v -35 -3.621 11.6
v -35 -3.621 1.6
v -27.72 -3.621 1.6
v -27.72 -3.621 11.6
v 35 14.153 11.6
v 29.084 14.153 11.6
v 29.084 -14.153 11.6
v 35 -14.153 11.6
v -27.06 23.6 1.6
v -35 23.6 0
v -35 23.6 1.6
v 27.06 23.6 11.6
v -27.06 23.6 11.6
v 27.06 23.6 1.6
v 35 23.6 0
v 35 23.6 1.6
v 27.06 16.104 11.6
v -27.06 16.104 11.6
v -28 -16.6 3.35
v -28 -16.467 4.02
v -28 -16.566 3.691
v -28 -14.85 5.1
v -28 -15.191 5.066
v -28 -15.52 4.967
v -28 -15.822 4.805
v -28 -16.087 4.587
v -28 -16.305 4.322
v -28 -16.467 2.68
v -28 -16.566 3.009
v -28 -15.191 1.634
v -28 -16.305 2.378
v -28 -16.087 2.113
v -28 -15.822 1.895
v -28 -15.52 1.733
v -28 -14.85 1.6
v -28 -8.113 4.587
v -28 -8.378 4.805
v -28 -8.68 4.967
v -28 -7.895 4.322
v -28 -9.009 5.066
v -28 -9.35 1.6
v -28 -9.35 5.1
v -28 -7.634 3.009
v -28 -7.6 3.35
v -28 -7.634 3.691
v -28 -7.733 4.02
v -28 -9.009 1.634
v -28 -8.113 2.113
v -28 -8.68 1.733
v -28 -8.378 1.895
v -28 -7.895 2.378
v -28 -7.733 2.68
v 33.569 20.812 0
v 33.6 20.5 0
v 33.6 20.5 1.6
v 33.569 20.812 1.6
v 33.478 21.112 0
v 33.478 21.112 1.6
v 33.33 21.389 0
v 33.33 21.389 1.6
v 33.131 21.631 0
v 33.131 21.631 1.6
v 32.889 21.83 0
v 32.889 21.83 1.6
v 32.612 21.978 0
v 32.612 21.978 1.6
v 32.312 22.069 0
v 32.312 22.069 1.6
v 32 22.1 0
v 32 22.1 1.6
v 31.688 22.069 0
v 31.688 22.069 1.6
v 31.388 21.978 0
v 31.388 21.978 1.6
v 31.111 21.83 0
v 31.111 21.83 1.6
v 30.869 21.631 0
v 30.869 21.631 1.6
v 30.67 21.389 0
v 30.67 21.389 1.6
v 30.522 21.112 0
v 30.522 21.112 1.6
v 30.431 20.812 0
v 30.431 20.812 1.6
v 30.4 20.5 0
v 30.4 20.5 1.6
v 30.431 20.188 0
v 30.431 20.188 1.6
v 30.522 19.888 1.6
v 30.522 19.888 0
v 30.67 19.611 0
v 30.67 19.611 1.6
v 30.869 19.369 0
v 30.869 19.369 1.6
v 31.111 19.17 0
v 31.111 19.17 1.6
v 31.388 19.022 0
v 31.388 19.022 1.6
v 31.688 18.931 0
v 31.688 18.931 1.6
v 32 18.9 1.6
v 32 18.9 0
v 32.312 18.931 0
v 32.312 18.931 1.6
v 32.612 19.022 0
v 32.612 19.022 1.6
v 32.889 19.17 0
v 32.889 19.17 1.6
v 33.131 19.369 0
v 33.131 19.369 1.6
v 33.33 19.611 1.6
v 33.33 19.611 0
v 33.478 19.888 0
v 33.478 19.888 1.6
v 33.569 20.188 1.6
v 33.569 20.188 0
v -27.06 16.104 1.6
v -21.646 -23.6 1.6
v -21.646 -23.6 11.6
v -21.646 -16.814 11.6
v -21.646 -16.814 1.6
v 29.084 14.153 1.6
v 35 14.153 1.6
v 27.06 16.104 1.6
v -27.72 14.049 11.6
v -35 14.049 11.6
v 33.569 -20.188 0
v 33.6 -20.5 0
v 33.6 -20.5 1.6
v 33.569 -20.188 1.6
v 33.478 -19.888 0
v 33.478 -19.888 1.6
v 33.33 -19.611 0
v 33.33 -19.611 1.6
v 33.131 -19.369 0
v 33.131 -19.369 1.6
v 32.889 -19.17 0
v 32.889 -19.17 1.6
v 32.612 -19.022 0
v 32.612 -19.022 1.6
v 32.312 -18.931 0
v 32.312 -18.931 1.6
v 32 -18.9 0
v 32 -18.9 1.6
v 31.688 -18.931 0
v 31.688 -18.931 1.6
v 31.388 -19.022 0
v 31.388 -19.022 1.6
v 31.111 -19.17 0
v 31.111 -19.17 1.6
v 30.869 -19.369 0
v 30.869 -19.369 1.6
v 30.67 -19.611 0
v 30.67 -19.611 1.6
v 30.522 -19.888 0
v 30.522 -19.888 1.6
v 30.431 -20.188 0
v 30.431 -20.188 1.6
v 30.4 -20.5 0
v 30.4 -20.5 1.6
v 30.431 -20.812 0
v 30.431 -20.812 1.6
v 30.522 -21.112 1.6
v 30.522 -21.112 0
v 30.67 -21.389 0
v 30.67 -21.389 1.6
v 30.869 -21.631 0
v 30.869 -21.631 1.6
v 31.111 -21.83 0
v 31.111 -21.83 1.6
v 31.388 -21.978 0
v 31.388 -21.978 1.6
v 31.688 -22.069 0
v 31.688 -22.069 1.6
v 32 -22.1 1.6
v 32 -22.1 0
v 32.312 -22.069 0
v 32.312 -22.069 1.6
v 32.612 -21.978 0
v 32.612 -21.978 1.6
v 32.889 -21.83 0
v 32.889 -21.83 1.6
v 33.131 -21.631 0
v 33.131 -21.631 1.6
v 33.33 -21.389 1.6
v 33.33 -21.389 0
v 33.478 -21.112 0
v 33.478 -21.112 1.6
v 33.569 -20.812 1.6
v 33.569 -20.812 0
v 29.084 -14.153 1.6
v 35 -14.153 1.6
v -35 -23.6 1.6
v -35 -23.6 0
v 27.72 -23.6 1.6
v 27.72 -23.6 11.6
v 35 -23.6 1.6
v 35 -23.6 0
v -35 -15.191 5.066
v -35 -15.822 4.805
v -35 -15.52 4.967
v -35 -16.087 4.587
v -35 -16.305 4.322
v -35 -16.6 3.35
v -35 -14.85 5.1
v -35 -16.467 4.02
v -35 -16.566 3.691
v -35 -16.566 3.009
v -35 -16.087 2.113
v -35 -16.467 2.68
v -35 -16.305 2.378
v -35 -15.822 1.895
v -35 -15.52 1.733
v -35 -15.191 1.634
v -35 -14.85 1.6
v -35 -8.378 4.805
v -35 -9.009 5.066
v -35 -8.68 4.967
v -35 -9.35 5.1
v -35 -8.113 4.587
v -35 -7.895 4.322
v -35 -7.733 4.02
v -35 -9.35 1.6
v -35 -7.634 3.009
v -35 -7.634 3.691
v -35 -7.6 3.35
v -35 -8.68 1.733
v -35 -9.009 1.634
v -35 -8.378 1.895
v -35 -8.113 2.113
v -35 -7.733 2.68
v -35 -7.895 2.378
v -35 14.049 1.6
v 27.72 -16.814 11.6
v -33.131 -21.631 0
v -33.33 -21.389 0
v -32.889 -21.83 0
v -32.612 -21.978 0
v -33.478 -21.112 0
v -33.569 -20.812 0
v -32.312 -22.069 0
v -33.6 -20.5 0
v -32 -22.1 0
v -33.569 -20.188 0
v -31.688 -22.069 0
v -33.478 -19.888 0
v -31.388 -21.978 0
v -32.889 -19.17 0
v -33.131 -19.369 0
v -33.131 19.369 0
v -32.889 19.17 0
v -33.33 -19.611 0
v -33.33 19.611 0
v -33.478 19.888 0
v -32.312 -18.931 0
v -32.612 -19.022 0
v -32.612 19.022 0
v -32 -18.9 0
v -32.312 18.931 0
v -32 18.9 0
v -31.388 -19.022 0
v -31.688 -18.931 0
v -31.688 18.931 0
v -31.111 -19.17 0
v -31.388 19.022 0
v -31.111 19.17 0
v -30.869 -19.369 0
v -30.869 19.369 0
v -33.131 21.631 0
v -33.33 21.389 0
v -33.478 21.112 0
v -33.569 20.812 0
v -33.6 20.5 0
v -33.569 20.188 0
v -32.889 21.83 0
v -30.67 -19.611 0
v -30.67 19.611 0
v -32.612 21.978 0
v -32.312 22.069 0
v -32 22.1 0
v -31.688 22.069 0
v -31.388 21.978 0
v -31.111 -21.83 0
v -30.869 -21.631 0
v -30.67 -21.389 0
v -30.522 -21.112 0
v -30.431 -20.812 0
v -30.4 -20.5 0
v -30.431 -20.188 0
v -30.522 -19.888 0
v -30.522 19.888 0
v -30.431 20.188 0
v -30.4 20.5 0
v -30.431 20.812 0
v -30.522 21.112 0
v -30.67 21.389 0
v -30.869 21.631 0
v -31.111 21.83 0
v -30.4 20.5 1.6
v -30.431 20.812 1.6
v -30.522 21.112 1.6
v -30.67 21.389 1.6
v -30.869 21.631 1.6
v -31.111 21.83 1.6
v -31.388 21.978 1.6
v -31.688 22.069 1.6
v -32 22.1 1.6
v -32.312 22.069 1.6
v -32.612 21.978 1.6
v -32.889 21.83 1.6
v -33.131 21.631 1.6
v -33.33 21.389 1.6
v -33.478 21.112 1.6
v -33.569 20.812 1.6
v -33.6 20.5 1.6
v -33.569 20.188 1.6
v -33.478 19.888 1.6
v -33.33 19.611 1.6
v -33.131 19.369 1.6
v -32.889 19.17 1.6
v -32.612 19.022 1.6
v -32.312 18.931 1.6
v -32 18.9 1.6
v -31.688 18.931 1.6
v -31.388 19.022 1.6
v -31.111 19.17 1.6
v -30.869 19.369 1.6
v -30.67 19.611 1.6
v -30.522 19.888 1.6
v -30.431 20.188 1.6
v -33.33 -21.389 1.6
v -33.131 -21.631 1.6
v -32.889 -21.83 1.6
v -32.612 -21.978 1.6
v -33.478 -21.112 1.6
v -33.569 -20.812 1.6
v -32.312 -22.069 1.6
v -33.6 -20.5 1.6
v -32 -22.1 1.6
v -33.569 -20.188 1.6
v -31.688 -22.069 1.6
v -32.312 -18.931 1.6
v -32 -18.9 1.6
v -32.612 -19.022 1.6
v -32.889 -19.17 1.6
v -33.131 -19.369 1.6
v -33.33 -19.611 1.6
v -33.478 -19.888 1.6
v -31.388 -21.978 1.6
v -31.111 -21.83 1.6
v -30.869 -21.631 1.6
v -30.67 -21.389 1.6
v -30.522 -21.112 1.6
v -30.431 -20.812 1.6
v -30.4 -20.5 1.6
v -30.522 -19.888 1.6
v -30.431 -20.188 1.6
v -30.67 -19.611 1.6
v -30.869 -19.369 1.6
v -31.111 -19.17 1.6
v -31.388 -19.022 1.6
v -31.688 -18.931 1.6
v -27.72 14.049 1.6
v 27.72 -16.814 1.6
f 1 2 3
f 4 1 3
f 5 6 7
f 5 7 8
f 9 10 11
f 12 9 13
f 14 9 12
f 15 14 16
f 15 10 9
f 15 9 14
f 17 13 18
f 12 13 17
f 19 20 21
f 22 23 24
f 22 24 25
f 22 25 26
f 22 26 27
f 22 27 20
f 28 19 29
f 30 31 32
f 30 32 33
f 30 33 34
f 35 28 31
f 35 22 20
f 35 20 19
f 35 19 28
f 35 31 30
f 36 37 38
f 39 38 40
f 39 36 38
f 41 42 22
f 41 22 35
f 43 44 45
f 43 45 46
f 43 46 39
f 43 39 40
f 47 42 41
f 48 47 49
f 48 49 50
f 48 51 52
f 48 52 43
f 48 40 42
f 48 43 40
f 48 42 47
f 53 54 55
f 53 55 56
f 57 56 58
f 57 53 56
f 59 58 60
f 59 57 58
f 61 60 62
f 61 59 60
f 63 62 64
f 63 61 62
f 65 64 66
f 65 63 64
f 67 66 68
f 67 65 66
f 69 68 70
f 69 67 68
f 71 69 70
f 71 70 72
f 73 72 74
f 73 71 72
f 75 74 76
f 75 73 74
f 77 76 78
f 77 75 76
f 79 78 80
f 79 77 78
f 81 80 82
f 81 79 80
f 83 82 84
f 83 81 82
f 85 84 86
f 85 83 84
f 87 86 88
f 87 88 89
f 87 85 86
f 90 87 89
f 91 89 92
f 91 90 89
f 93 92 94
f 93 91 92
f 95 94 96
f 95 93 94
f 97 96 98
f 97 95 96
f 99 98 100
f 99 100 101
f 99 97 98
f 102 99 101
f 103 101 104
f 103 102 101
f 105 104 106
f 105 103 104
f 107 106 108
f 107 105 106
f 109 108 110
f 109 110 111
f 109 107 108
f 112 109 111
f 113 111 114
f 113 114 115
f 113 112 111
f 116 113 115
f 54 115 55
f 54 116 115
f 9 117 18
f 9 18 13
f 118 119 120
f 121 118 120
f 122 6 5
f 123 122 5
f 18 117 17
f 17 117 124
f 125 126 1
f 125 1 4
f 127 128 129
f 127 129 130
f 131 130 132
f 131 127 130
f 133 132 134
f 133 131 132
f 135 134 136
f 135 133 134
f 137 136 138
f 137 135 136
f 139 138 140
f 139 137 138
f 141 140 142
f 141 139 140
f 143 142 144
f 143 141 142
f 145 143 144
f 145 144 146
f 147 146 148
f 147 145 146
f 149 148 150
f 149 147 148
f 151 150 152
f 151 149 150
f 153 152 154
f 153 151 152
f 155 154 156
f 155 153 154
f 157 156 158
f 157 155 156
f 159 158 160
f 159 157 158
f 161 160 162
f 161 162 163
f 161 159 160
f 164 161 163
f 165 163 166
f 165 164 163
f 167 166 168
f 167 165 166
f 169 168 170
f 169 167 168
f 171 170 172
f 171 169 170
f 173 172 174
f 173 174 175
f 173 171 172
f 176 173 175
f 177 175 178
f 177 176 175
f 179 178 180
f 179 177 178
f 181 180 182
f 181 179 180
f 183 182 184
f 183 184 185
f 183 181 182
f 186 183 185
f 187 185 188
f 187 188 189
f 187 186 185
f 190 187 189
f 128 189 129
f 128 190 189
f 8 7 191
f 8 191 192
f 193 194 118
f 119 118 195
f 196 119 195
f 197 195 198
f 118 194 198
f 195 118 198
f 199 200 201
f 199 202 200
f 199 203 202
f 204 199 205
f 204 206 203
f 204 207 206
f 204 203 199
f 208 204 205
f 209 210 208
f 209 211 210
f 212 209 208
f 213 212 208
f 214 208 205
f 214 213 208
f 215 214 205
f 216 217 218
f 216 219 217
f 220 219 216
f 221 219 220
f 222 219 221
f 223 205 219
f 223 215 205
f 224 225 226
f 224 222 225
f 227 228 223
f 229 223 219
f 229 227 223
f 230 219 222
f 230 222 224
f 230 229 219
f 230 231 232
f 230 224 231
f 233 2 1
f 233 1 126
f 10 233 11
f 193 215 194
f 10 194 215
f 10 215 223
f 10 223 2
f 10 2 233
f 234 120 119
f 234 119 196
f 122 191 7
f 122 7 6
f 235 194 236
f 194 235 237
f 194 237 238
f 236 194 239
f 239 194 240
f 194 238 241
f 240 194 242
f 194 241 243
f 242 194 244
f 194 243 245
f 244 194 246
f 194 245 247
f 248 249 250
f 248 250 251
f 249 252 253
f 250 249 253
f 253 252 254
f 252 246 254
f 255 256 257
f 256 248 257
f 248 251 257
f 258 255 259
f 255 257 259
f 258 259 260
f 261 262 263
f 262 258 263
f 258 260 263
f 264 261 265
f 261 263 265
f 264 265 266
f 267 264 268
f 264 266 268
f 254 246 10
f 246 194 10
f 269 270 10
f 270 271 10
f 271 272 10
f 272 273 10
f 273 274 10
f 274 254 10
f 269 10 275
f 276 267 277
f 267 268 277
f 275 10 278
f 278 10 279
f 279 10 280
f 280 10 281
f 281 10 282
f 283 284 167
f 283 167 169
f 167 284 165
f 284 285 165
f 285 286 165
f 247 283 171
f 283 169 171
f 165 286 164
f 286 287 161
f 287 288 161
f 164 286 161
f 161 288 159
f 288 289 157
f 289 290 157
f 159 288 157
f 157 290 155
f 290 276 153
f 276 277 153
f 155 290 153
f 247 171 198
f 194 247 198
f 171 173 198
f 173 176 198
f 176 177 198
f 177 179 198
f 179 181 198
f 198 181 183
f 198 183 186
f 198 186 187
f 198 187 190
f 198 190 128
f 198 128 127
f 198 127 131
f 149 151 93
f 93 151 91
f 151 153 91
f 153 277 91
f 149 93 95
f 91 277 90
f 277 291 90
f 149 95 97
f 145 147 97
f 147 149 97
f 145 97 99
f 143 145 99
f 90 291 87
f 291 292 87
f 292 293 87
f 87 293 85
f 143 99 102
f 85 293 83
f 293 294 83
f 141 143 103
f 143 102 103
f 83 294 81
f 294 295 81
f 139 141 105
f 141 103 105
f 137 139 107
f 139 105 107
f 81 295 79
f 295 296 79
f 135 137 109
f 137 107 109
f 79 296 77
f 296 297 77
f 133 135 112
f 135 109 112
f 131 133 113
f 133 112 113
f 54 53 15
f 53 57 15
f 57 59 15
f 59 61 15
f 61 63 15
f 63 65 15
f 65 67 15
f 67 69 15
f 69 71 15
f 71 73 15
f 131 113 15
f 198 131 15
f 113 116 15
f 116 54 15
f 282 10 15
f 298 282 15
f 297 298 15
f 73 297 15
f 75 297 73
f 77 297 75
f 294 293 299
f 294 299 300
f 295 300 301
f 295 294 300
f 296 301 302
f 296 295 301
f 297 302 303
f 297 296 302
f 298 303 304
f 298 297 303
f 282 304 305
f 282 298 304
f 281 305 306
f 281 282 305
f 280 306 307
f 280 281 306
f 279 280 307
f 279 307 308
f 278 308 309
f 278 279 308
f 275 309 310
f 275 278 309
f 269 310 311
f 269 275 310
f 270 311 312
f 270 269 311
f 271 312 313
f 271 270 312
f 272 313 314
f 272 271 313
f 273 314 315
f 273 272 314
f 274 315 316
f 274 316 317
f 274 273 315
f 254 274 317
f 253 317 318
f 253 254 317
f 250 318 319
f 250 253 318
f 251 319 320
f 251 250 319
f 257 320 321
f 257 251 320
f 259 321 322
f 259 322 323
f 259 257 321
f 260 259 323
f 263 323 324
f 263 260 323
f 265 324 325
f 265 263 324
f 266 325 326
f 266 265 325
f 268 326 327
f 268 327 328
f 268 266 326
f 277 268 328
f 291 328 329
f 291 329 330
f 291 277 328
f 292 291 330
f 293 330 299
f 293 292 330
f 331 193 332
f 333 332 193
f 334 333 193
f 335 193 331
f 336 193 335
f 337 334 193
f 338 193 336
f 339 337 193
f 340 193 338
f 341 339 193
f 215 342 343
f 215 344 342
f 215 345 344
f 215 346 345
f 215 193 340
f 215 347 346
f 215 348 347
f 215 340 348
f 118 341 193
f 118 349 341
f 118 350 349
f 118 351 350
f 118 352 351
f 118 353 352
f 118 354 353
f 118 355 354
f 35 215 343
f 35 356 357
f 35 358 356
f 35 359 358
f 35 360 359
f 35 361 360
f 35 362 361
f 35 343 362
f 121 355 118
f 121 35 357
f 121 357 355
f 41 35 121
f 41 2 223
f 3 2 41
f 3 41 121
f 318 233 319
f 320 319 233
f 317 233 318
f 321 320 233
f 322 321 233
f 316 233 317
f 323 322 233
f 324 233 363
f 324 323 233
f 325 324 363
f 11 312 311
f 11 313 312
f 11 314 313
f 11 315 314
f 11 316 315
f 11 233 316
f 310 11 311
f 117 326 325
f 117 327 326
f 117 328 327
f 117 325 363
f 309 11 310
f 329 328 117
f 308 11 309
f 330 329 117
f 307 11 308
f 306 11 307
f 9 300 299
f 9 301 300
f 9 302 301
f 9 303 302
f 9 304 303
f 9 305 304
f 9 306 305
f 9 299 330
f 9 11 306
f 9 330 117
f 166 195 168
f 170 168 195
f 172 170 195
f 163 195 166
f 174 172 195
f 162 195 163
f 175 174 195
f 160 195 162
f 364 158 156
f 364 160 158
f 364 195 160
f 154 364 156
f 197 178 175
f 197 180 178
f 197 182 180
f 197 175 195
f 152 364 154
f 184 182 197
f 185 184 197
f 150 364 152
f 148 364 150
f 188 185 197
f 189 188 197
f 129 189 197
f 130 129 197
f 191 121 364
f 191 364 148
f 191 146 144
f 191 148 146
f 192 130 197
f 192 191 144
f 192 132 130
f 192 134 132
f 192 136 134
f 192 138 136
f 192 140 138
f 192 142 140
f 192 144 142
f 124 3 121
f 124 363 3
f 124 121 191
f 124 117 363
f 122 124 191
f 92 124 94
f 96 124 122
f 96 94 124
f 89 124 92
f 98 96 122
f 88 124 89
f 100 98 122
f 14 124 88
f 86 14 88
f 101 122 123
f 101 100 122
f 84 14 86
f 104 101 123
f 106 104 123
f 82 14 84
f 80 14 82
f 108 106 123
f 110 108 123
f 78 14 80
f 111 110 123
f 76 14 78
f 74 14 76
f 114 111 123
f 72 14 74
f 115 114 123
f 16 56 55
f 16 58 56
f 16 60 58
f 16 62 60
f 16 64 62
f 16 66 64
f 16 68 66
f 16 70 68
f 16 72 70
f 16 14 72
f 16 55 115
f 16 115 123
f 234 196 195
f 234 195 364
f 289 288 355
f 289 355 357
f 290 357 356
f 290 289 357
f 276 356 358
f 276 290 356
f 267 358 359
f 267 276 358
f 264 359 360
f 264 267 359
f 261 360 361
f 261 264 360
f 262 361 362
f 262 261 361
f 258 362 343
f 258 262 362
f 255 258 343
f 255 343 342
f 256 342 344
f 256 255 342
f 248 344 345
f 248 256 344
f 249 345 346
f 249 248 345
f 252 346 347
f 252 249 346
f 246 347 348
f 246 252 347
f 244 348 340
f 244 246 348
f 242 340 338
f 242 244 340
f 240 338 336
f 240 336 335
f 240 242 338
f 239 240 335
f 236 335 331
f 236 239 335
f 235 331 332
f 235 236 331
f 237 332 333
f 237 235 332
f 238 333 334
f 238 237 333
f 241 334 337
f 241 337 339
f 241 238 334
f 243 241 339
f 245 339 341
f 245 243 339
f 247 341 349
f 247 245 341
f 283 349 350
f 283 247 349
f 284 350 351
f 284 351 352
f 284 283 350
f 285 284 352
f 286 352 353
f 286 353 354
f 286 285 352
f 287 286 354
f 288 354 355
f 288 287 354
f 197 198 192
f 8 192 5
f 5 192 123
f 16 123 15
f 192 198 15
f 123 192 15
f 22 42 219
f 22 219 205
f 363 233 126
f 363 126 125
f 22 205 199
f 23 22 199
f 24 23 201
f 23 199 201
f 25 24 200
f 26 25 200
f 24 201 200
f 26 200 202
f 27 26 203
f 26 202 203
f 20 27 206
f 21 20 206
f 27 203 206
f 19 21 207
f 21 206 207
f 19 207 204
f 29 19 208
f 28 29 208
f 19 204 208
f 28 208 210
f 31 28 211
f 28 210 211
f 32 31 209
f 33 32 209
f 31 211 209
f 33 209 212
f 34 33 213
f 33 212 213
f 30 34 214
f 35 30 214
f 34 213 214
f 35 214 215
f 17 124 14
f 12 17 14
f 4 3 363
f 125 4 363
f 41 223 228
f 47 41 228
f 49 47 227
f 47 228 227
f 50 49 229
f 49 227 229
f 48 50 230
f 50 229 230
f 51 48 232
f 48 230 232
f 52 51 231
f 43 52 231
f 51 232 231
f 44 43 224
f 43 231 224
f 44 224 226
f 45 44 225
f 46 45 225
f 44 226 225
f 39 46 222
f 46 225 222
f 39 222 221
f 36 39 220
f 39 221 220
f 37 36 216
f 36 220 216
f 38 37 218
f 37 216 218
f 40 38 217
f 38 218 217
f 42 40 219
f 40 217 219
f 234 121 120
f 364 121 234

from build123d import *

# Parameters (mm, degrees)
ESBO_O1_W                = 70
ESBO_O1_H                = 47.2
ESBO_O1_R                = 1.6
RESSALTO_EXTRUS_O1_DEPTH = 1.6
ESBO_O2_W                = 49.366448858
ESBO_O2_H                = 6.785766069
ESBO_O2_W_2              = 54.120377738
ESBO_O2_H_2              = 7.496391297
ESBO_O2_W_3              = 5.916216247
ESBO_O2_H_3              = 28.306864236
ESBO_O2_W_4              = 7.279806524
ESBO_O2_H_4              = 17.669935009
RESSALTO_EXTRUS_O2_DEPTH = 10
RESSALTO_EXTRUS_O3_DEPTH = 7


with BuildPart() as part:
    # Esboço1 → Ressalto-extrusão1 (new body)
    with BuildSketch(Plane.XY):
        Rectangle(ESBO_O1_W, ESBO_O1_H)
        with Locations((-32, 20.5)):
            Circle(ESBO_O1_R, mode=Mode.SUBTRACT)
        with Locations((32, 20.5)):
            Circle(ESBO_O1_R, mode=Mode.SUBTRACT)
        with Locations((32, -20.5)):
            Circle(ESBO_O1_R, mode=Mode.SUBTRACT)
        with Locations((-32, -20.5)):
            Circle(ESBO_O1_R, mode=Mode.SUBTRACT)
    extrude(amount=RESSALTO_EXTRUS_O1_DEPTH)

    # Esboço2 → Ressalto-extrusão2 (add)
    with BuildSketch(Plane.XY.offset(1.6)):
        with Locations((3.036969047, -20.207116965)):
            Rectangle(ESBO_O2_W, ESBO_O2_H)
        with Locations((0, 19.851804352)):
            Rectangle(ESBO_O2_W_2, ESBO_O2_H_2)
        with Locations((32.041891877, 0)):
            Rectangle(ESBO_O2_W_3, ESBO_O2_H_3)
        with Locations((-31.360096738, 5.213703653)):
            Rectangle(ESBO_O2_W_4, ESBO_O2_H_4)
    extrude(amount=RESSALTO_EXTRUS_O2_DEPTH)

    # Esboço3 → Ressalto-extrusão3 (add)
    with BuildSketch(Plane.ZY.offset(35)):
        with BuildLine():
            Line((5.1, -9.35), (5.1, -14.85))
            ThreePointArc((5.1, -14.85), (3.35, -16.6), (1.6, -14.85))
            Line((1.6, -14.85), (1.6, -9.35))
            ThreePointArc((1.6, -9.35), (3.35, -7.6), (5.1, -9.35))
        make_face()
    extrude(amount=-RESSALTO_EXTRUS_O3_DEPTH)


solid = part.part
